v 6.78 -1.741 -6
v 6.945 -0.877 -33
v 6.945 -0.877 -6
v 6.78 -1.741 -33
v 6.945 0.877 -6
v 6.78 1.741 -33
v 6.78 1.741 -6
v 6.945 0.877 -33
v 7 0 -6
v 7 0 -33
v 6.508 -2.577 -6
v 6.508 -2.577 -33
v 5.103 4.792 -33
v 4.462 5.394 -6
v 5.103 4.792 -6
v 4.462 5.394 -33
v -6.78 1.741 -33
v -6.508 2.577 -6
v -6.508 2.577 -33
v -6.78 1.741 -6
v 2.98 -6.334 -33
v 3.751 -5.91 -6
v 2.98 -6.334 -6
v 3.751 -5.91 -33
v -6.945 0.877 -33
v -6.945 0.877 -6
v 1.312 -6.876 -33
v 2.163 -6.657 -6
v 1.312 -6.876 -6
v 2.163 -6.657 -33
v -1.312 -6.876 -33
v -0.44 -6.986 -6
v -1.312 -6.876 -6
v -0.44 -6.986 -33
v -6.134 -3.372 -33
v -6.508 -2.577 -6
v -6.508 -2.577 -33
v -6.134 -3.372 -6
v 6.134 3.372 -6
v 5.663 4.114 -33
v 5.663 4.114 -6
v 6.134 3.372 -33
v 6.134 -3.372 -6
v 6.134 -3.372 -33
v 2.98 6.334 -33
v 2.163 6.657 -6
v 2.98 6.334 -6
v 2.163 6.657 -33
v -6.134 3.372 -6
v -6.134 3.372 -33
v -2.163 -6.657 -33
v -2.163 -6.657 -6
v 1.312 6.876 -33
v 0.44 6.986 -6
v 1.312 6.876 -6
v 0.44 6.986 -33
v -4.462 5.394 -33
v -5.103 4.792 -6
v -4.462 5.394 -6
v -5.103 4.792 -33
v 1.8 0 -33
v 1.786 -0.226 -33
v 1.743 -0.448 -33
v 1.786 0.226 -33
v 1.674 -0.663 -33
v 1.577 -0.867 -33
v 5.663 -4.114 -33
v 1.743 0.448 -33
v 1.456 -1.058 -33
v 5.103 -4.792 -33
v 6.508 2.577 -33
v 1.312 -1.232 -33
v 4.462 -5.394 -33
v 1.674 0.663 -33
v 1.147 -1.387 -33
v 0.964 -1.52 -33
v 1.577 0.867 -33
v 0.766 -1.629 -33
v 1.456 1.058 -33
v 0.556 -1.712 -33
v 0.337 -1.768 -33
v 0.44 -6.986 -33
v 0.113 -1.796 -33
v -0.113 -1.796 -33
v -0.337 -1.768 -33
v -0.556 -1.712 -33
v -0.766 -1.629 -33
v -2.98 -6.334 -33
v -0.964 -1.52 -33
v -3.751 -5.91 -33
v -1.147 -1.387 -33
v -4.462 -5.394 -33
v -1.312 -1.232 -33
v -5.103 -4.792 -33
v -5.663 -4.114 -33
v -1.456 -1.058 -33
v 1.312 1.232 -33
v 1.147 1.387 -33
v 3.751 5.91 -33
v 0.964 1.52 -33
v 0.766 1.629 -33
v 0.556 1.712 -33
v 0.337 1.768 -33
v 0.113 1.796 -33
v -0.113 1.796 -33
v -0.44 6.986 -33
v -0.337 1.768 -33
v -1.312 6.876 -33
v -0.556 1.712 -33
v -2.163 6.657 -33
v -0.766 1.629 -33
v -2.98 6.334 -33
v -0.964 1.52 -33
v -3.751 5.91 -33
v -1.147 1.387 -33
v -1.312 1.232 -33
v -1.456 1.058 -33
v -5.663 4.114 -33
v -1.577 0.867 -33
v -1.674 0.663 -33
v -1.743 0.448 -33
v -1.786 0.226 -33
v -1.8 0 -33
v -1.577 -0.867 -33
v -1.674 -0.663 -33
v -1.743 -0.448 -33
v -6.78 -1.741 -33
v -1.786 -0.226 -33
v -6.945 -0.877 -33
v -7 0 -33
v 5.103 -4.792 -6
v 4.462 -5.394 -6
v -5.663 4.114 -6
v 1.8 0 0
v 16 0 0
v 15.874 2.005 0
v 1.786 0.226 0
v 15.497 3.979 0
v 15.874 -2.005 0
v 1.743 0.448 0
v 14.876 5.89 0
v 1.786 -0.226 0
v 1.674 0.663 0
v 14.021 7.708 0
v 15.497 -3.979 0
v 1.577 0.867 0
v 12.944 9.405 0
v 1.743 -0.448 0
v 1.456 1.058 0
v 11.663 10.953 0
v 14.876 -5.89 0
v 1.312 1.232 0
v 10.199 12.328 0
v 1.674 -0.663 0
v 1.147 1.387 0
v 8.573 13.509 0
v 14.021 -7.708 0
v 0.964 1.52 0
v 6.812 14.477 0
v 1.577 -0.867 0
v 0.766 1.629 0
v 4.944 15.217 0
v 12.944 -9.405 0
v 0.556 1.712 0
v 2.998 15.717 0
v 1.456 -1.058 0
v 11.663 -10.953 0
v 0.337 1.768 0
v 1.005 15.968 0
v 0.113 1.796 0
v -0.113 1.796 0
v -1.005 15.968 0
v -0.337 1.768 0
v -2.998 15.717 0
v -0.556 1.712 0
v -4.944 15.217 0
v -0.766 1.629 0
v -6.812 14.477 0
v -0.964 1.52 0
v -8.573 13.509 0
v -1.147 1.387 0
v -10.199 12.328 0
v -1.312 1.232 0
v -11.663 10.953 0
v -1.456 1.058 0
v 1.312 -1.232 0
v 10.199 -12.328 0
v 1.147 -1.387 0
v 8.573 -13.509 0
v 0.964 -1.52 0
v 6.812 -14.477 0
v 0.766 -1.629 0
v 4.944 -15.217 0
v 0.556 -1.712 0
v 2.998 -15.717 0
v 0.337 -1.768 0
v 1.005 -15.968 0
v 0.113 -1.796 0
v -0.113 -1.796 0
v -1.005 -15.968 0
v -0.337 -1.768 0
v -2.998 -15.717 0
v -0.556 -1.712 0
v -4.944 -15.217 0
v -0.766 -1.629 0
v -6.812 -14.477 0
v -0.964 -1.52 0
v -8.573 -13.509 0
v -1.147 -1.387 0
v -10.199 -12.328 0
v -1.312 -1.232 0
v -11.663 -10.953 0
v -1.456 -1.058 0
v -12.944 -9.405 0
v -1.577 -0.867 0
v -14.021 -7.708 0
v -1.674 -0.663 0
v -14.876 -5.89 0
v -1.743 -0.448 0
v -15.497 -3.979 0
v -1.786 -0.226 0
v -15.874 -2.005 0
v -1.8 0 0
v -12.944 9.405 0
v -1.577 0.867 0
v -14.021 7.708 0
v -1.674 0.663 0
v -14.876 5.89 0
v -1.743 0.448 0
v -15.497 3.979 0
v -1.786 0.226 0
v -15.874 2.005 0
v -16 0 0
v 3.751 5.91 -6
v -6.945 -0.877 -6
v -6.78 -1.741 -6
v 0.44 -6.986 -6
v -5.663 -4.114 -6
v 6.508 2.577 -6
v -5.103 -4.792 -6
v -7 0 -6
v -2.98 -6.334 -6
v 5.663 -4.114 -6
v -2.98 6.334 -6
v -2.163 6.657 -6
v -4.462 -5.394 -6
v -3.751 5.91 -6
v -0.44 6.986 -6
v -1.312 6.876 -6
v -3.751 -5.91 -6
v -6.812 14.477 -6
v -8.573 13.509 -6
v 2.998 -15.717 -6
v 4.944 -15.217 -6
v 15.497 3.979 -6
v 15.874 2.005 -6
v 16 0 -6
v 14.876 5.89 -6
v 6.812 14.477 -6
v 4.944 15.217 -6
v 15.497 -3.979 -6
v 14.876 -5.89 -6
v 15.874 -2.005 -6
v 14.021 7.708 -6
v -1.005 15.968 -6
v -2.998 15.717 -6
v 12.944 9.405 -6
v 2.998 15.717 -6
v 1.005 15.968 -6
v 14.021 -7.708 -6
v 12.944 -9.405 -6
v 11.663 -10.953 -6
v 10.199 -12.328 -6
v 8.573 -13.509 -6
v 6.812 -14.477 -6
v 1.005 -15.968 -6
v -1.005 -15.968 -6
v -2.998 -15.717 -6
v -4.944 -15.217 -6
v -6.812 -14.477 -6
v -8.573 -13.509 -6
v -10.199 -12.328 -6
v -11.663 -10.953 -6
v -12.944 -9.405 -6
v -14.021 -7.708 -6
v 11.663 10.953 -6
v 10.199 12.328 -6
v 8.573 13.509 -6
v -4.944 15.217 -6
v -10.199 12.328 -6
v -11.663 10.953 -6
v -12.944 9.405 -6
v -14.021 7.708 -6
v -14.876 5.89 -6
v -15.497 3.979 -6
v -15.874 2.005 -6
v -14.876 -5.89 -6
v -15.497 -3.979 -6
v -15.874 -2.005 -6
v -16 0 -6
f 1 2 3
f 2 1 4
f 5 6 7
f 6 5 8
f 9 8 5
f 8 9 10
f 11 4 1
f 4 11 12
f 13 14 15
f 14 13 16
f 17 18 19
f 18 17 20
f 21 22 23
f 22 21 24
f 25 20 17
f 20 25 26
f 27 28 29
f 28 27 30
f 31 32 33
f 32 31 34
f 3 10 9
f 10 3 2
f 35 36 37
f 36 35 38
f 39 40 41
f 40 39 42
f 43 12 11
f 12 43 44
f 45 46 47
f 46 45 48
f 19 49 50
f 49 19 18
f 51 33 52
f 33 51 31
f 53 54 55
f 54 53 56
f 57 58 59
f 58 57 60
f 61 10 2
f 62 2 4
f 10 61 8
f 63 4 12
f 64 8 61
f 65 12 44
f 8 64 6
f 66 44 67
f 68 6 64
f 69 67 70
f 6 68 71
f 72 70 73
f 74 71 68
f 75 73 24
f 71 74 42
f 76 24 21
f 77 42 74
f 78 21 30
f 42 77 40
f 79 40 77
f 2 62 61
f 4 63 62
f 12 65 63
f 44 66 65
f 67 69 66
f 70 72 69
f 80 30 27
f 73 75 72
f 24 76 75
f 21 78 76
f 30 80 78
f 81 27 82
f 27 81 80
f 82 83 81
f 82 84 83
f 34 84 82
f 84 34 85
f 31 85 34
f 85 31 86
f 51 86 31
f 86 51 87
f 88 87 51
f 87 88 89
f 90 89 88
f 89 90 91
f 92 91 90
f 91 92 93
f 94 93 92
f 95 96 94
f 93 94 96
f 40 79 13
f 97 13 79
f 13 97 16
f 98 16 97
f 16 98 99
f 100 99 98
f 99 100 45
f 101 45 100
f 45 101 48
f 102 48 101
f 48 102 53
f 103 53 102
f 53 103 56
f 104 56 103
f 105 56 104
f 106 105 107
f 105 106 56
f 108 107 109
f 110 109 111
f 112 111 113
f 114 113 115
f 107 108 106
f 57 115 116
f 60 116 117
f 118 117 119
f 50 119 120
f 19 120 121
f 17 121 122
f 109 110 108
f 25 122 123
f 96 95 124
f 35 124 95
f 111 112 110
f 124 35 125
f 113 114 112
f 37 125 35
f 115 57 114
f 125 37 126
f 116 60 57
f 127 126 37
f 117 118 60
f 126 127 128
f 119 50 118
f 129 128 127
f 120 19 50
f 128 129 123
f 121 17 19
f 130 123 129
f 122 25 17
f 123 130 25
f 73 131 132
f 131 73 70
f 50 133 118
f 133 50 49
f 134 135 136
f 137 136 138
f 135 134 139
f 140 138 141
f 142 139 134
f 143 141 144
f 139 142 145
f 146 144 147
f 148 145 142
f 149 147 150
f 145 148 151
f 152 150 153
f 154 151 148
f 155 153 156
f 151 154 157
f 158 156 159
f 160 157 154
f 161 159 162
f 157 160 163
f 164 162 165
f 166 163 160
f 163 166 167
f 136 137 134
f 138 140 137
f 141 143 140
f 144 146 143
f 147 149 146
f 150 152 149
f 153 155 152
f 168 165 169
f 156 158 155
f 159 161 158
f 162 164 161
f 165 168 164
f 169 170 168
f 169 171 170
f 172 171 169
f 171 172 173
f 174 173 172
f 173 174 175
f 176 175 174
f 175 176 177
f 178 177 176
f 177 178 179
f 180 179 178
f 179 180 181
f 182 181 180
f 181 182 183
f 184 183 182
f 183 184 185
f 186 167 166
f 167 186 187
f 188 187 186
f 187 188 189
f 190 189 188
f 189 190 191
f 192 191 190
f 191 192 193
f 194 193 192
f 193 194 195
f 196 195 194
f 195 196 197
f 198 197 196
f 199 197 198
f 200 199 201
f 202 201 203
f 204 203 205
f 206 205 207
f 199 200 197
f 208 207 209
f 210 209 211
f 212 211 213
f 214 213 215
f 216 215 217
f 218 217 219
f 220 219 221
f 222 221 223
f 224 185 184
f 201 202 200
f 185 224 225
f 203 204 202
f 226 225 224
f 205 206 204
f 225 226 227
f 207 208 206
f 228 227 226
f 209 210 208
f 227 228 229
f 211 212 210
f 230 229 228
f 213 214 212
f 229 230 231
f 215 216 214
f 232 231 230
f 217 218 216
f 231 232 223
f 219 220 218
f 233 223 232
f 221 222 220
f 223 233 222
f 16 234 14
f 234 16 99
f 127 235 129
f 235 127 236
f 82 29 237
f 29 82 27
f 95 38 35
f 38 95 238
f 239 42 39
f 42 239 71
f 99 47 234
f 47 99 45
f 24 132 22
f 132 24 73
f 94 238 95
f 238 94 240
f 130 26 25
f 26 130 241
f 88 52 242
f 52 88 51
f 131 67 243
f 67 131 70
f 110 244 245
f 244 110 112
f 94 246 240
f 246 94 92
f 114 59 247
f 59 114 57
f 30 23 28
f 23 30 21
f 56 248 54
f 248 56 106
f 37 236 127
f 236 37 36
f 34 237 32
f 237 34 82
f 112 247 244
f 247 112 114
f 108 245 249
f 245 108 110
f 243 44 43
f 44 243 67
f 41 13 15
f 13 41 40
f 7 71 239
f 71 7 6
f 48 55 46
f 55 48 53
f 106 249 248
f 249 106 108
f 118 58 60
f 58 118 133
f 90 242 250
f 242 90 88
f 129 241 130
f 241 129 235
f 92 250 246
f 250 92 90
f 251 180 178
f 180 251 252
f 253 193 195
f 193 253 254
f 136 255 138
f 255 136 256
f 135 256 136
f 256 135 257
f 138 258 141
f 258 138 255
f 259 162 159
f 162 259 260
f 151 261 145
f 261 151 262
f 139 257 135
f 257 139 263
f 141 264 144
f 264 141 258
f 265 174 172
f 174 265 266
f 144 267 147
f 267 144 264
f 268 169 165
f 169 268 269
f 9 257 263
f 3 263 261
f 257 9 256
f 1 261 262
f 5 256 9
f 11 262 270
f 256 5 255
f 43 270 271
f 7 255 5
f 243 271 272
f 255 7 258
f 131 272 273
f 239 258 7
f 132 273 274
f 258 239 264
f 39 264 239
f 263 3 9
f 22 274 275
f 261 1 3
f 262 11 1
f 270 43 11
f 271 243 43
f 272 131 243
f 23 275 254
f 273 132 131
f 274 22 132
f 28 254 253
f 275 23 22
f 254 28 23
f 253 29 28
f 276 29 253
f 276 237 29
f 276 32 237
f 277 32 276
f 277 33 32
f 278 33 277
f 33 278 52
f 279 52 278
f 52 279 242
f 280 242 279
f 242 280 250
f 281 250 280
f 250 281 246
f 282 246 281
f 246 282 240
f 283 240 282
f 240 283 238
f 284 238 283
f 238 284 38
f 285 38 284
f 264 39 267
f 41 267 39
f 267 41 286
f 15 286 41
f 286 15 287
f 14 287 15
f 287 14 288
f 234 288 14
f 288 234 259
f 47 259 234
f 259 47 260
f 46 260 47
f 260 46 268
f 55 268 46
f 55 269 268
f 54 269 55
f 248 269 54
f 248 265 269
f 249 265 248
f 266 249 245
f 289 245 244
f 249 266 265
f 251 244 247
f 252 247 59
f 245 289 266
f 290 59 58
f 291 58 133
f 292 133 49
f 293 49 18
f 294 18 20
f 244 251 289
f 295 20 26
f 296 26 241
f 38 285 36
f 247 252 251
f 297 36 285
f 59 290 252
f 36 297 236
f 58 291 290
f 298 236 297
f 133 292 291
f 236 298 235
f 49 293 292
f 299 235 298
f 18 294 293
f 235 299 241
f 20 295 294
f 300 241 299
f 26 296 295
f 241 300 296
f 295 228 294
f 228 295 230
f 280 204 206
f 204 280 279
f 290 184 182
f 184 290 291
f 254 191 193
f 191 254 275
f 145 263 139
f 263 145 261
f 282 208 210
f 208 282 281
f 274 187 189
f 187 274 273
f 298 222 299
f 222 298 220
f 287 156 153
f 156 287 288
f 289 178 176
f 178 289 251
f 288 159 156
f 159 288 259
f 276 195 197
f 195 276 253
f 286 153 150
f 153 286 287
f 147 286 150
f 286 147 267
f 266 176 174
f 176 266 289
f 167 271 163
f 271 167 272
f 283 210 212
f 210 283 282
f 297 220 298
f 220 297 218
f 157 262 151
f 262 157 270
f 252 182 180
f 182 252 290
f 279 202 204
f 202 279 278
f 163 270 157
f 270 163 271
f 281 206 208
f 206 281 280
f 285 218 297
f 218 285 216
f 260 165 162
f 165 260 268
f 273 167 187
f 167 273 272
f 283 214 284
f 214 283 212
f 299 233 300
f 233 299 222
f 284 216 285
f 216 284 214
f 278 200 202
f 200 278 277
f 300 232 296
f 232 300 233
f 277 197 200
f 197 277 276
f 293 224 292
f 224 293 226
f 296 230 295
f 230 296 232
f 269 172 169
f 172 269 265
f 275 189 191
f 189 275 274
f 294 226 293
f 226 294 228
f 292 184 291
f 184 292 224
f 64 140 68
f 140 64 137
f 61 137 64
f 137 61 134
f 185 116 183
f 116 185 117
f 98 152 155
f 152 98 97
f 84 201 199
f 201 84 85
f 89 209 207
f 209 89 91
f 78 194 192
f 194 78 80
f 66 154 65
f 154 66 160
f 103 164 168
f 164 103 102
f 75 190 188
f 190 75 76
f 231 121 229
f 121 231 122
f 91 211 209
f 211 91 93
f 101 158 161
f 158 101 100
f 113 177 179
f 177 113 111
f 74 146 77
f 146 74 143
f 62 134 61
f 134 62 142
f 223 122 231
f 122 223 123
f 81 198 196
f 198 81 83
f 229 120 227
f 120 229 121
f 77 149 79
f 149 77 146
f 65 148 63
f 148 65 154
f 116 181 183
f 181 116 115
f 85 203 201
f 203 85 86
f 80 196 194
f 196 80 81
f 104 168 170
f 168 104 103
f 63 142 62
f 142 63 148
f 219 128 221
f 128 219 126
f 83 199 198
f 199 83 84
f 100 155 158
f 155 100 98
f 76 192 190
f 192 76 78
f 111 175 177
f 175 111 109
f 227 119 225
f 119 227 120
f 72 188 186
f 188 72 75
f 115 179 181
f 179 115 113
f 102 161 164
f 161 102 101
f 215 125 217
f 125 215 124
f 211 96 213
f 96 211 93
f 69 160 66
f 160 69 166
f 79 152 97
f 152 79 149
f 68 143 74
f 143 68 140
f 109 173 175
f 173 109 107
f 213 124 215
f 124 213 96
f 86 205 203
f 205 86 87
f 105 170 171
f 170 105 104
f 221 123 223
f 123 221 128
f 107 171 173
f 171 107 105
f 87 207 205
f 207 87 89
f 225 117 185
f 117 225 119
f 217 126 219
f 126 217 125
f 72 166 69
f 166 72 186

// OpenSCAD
$fn = 50;


difference() {
	union() {
		translate(v = [0, 0, -33.0000000000]) {
			cylinder(h = 33, r = 7.0000000000);
		}
		translate(v = [0, 0, -6.0000000000]) {
			cylinder(h = 6, r = 16.0000000000);
		}
	}
	union() {
		#translate(v = [0, 0, -33]) {
			cylinder(h = 33, r = 1.8000000000);
		}
	}
}
